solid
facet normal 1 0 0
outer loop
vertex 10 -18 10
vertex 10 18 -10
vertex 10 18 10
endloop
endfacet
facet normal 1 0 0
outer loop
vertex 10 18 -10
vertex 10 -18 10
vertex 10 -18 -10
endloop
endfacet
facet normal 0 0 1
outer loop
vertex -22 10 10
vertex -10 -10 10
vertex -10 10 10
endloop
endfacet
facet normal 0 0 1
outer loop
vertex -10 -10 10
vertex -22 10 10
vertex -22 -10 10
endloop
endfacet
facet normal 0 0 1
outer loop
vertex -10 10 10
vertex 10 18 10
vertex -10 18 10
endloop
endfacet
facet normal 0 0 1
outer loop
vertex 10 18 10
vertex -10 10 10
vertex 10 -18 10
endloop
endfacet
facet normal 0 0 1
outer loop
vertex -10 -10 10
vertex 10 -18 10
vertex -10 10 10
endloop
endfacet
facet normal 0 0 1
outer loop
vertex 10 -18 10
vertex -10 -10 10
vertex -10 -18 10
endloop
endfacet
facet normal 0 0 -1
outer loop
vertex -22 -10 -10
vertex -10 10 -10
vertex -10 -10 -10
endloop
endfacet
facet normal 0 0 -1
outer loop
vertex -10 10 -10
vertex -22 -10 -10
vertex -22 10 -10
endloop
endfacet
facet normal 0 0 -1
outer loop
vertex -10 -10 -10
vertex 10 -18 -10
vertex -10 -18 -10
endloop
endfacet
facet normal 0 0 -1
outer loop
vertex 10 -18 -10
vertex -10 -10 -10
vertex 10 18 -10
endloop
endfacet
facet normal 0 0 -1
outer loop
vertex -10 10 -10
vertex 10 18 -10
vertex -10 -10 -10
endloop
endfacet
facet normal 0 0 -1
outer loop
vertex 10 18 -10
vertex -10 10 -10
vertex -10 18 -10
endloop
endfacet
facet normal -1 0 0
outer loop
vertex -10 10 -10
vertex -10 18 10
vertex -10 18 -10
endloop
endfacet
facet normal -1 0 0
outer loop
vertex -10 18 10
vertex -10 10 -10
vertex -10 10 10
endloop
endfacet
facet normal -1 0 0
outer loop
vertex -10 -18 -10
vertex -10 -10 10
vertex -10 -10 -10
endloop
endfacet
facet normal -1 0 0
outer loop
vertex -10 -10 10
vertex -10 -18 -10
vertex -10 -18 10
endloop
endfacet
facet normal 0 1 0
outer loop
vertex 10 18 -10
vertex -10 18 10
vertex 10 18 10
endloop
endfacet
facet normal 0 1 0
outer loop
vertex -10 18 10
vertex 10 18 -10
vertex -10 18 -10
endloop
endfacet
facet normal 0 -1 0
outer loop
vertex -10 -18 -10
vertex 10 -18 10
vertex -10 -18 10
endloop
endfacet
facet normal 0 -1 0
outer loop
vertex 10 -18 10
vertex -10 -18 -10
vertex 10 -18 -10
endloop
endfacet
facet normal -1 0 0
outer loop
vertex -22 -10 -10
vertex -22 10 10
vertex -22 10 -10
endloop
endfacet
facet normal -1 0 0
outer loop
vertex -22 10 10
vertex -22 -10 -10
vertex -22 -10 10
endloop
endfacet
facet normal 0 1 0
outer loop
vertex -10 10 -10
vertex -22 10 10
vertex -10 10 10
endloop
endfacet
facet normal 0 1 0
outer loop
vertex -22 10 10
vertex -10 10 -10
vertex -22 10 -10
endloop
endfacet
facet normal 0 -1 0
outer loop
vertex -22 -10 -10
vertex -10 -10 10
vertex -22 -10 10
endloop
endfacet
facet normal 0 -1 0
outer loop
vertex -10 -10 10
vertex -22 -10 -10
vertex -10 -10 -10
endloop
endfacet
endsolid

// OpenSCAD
translate([0,8,0]) cube([20,20,20],true);
translate([0,-8,0])  cube([20,20,20],true);
translate([-12,0,0])  cube([20,20,20],true);
